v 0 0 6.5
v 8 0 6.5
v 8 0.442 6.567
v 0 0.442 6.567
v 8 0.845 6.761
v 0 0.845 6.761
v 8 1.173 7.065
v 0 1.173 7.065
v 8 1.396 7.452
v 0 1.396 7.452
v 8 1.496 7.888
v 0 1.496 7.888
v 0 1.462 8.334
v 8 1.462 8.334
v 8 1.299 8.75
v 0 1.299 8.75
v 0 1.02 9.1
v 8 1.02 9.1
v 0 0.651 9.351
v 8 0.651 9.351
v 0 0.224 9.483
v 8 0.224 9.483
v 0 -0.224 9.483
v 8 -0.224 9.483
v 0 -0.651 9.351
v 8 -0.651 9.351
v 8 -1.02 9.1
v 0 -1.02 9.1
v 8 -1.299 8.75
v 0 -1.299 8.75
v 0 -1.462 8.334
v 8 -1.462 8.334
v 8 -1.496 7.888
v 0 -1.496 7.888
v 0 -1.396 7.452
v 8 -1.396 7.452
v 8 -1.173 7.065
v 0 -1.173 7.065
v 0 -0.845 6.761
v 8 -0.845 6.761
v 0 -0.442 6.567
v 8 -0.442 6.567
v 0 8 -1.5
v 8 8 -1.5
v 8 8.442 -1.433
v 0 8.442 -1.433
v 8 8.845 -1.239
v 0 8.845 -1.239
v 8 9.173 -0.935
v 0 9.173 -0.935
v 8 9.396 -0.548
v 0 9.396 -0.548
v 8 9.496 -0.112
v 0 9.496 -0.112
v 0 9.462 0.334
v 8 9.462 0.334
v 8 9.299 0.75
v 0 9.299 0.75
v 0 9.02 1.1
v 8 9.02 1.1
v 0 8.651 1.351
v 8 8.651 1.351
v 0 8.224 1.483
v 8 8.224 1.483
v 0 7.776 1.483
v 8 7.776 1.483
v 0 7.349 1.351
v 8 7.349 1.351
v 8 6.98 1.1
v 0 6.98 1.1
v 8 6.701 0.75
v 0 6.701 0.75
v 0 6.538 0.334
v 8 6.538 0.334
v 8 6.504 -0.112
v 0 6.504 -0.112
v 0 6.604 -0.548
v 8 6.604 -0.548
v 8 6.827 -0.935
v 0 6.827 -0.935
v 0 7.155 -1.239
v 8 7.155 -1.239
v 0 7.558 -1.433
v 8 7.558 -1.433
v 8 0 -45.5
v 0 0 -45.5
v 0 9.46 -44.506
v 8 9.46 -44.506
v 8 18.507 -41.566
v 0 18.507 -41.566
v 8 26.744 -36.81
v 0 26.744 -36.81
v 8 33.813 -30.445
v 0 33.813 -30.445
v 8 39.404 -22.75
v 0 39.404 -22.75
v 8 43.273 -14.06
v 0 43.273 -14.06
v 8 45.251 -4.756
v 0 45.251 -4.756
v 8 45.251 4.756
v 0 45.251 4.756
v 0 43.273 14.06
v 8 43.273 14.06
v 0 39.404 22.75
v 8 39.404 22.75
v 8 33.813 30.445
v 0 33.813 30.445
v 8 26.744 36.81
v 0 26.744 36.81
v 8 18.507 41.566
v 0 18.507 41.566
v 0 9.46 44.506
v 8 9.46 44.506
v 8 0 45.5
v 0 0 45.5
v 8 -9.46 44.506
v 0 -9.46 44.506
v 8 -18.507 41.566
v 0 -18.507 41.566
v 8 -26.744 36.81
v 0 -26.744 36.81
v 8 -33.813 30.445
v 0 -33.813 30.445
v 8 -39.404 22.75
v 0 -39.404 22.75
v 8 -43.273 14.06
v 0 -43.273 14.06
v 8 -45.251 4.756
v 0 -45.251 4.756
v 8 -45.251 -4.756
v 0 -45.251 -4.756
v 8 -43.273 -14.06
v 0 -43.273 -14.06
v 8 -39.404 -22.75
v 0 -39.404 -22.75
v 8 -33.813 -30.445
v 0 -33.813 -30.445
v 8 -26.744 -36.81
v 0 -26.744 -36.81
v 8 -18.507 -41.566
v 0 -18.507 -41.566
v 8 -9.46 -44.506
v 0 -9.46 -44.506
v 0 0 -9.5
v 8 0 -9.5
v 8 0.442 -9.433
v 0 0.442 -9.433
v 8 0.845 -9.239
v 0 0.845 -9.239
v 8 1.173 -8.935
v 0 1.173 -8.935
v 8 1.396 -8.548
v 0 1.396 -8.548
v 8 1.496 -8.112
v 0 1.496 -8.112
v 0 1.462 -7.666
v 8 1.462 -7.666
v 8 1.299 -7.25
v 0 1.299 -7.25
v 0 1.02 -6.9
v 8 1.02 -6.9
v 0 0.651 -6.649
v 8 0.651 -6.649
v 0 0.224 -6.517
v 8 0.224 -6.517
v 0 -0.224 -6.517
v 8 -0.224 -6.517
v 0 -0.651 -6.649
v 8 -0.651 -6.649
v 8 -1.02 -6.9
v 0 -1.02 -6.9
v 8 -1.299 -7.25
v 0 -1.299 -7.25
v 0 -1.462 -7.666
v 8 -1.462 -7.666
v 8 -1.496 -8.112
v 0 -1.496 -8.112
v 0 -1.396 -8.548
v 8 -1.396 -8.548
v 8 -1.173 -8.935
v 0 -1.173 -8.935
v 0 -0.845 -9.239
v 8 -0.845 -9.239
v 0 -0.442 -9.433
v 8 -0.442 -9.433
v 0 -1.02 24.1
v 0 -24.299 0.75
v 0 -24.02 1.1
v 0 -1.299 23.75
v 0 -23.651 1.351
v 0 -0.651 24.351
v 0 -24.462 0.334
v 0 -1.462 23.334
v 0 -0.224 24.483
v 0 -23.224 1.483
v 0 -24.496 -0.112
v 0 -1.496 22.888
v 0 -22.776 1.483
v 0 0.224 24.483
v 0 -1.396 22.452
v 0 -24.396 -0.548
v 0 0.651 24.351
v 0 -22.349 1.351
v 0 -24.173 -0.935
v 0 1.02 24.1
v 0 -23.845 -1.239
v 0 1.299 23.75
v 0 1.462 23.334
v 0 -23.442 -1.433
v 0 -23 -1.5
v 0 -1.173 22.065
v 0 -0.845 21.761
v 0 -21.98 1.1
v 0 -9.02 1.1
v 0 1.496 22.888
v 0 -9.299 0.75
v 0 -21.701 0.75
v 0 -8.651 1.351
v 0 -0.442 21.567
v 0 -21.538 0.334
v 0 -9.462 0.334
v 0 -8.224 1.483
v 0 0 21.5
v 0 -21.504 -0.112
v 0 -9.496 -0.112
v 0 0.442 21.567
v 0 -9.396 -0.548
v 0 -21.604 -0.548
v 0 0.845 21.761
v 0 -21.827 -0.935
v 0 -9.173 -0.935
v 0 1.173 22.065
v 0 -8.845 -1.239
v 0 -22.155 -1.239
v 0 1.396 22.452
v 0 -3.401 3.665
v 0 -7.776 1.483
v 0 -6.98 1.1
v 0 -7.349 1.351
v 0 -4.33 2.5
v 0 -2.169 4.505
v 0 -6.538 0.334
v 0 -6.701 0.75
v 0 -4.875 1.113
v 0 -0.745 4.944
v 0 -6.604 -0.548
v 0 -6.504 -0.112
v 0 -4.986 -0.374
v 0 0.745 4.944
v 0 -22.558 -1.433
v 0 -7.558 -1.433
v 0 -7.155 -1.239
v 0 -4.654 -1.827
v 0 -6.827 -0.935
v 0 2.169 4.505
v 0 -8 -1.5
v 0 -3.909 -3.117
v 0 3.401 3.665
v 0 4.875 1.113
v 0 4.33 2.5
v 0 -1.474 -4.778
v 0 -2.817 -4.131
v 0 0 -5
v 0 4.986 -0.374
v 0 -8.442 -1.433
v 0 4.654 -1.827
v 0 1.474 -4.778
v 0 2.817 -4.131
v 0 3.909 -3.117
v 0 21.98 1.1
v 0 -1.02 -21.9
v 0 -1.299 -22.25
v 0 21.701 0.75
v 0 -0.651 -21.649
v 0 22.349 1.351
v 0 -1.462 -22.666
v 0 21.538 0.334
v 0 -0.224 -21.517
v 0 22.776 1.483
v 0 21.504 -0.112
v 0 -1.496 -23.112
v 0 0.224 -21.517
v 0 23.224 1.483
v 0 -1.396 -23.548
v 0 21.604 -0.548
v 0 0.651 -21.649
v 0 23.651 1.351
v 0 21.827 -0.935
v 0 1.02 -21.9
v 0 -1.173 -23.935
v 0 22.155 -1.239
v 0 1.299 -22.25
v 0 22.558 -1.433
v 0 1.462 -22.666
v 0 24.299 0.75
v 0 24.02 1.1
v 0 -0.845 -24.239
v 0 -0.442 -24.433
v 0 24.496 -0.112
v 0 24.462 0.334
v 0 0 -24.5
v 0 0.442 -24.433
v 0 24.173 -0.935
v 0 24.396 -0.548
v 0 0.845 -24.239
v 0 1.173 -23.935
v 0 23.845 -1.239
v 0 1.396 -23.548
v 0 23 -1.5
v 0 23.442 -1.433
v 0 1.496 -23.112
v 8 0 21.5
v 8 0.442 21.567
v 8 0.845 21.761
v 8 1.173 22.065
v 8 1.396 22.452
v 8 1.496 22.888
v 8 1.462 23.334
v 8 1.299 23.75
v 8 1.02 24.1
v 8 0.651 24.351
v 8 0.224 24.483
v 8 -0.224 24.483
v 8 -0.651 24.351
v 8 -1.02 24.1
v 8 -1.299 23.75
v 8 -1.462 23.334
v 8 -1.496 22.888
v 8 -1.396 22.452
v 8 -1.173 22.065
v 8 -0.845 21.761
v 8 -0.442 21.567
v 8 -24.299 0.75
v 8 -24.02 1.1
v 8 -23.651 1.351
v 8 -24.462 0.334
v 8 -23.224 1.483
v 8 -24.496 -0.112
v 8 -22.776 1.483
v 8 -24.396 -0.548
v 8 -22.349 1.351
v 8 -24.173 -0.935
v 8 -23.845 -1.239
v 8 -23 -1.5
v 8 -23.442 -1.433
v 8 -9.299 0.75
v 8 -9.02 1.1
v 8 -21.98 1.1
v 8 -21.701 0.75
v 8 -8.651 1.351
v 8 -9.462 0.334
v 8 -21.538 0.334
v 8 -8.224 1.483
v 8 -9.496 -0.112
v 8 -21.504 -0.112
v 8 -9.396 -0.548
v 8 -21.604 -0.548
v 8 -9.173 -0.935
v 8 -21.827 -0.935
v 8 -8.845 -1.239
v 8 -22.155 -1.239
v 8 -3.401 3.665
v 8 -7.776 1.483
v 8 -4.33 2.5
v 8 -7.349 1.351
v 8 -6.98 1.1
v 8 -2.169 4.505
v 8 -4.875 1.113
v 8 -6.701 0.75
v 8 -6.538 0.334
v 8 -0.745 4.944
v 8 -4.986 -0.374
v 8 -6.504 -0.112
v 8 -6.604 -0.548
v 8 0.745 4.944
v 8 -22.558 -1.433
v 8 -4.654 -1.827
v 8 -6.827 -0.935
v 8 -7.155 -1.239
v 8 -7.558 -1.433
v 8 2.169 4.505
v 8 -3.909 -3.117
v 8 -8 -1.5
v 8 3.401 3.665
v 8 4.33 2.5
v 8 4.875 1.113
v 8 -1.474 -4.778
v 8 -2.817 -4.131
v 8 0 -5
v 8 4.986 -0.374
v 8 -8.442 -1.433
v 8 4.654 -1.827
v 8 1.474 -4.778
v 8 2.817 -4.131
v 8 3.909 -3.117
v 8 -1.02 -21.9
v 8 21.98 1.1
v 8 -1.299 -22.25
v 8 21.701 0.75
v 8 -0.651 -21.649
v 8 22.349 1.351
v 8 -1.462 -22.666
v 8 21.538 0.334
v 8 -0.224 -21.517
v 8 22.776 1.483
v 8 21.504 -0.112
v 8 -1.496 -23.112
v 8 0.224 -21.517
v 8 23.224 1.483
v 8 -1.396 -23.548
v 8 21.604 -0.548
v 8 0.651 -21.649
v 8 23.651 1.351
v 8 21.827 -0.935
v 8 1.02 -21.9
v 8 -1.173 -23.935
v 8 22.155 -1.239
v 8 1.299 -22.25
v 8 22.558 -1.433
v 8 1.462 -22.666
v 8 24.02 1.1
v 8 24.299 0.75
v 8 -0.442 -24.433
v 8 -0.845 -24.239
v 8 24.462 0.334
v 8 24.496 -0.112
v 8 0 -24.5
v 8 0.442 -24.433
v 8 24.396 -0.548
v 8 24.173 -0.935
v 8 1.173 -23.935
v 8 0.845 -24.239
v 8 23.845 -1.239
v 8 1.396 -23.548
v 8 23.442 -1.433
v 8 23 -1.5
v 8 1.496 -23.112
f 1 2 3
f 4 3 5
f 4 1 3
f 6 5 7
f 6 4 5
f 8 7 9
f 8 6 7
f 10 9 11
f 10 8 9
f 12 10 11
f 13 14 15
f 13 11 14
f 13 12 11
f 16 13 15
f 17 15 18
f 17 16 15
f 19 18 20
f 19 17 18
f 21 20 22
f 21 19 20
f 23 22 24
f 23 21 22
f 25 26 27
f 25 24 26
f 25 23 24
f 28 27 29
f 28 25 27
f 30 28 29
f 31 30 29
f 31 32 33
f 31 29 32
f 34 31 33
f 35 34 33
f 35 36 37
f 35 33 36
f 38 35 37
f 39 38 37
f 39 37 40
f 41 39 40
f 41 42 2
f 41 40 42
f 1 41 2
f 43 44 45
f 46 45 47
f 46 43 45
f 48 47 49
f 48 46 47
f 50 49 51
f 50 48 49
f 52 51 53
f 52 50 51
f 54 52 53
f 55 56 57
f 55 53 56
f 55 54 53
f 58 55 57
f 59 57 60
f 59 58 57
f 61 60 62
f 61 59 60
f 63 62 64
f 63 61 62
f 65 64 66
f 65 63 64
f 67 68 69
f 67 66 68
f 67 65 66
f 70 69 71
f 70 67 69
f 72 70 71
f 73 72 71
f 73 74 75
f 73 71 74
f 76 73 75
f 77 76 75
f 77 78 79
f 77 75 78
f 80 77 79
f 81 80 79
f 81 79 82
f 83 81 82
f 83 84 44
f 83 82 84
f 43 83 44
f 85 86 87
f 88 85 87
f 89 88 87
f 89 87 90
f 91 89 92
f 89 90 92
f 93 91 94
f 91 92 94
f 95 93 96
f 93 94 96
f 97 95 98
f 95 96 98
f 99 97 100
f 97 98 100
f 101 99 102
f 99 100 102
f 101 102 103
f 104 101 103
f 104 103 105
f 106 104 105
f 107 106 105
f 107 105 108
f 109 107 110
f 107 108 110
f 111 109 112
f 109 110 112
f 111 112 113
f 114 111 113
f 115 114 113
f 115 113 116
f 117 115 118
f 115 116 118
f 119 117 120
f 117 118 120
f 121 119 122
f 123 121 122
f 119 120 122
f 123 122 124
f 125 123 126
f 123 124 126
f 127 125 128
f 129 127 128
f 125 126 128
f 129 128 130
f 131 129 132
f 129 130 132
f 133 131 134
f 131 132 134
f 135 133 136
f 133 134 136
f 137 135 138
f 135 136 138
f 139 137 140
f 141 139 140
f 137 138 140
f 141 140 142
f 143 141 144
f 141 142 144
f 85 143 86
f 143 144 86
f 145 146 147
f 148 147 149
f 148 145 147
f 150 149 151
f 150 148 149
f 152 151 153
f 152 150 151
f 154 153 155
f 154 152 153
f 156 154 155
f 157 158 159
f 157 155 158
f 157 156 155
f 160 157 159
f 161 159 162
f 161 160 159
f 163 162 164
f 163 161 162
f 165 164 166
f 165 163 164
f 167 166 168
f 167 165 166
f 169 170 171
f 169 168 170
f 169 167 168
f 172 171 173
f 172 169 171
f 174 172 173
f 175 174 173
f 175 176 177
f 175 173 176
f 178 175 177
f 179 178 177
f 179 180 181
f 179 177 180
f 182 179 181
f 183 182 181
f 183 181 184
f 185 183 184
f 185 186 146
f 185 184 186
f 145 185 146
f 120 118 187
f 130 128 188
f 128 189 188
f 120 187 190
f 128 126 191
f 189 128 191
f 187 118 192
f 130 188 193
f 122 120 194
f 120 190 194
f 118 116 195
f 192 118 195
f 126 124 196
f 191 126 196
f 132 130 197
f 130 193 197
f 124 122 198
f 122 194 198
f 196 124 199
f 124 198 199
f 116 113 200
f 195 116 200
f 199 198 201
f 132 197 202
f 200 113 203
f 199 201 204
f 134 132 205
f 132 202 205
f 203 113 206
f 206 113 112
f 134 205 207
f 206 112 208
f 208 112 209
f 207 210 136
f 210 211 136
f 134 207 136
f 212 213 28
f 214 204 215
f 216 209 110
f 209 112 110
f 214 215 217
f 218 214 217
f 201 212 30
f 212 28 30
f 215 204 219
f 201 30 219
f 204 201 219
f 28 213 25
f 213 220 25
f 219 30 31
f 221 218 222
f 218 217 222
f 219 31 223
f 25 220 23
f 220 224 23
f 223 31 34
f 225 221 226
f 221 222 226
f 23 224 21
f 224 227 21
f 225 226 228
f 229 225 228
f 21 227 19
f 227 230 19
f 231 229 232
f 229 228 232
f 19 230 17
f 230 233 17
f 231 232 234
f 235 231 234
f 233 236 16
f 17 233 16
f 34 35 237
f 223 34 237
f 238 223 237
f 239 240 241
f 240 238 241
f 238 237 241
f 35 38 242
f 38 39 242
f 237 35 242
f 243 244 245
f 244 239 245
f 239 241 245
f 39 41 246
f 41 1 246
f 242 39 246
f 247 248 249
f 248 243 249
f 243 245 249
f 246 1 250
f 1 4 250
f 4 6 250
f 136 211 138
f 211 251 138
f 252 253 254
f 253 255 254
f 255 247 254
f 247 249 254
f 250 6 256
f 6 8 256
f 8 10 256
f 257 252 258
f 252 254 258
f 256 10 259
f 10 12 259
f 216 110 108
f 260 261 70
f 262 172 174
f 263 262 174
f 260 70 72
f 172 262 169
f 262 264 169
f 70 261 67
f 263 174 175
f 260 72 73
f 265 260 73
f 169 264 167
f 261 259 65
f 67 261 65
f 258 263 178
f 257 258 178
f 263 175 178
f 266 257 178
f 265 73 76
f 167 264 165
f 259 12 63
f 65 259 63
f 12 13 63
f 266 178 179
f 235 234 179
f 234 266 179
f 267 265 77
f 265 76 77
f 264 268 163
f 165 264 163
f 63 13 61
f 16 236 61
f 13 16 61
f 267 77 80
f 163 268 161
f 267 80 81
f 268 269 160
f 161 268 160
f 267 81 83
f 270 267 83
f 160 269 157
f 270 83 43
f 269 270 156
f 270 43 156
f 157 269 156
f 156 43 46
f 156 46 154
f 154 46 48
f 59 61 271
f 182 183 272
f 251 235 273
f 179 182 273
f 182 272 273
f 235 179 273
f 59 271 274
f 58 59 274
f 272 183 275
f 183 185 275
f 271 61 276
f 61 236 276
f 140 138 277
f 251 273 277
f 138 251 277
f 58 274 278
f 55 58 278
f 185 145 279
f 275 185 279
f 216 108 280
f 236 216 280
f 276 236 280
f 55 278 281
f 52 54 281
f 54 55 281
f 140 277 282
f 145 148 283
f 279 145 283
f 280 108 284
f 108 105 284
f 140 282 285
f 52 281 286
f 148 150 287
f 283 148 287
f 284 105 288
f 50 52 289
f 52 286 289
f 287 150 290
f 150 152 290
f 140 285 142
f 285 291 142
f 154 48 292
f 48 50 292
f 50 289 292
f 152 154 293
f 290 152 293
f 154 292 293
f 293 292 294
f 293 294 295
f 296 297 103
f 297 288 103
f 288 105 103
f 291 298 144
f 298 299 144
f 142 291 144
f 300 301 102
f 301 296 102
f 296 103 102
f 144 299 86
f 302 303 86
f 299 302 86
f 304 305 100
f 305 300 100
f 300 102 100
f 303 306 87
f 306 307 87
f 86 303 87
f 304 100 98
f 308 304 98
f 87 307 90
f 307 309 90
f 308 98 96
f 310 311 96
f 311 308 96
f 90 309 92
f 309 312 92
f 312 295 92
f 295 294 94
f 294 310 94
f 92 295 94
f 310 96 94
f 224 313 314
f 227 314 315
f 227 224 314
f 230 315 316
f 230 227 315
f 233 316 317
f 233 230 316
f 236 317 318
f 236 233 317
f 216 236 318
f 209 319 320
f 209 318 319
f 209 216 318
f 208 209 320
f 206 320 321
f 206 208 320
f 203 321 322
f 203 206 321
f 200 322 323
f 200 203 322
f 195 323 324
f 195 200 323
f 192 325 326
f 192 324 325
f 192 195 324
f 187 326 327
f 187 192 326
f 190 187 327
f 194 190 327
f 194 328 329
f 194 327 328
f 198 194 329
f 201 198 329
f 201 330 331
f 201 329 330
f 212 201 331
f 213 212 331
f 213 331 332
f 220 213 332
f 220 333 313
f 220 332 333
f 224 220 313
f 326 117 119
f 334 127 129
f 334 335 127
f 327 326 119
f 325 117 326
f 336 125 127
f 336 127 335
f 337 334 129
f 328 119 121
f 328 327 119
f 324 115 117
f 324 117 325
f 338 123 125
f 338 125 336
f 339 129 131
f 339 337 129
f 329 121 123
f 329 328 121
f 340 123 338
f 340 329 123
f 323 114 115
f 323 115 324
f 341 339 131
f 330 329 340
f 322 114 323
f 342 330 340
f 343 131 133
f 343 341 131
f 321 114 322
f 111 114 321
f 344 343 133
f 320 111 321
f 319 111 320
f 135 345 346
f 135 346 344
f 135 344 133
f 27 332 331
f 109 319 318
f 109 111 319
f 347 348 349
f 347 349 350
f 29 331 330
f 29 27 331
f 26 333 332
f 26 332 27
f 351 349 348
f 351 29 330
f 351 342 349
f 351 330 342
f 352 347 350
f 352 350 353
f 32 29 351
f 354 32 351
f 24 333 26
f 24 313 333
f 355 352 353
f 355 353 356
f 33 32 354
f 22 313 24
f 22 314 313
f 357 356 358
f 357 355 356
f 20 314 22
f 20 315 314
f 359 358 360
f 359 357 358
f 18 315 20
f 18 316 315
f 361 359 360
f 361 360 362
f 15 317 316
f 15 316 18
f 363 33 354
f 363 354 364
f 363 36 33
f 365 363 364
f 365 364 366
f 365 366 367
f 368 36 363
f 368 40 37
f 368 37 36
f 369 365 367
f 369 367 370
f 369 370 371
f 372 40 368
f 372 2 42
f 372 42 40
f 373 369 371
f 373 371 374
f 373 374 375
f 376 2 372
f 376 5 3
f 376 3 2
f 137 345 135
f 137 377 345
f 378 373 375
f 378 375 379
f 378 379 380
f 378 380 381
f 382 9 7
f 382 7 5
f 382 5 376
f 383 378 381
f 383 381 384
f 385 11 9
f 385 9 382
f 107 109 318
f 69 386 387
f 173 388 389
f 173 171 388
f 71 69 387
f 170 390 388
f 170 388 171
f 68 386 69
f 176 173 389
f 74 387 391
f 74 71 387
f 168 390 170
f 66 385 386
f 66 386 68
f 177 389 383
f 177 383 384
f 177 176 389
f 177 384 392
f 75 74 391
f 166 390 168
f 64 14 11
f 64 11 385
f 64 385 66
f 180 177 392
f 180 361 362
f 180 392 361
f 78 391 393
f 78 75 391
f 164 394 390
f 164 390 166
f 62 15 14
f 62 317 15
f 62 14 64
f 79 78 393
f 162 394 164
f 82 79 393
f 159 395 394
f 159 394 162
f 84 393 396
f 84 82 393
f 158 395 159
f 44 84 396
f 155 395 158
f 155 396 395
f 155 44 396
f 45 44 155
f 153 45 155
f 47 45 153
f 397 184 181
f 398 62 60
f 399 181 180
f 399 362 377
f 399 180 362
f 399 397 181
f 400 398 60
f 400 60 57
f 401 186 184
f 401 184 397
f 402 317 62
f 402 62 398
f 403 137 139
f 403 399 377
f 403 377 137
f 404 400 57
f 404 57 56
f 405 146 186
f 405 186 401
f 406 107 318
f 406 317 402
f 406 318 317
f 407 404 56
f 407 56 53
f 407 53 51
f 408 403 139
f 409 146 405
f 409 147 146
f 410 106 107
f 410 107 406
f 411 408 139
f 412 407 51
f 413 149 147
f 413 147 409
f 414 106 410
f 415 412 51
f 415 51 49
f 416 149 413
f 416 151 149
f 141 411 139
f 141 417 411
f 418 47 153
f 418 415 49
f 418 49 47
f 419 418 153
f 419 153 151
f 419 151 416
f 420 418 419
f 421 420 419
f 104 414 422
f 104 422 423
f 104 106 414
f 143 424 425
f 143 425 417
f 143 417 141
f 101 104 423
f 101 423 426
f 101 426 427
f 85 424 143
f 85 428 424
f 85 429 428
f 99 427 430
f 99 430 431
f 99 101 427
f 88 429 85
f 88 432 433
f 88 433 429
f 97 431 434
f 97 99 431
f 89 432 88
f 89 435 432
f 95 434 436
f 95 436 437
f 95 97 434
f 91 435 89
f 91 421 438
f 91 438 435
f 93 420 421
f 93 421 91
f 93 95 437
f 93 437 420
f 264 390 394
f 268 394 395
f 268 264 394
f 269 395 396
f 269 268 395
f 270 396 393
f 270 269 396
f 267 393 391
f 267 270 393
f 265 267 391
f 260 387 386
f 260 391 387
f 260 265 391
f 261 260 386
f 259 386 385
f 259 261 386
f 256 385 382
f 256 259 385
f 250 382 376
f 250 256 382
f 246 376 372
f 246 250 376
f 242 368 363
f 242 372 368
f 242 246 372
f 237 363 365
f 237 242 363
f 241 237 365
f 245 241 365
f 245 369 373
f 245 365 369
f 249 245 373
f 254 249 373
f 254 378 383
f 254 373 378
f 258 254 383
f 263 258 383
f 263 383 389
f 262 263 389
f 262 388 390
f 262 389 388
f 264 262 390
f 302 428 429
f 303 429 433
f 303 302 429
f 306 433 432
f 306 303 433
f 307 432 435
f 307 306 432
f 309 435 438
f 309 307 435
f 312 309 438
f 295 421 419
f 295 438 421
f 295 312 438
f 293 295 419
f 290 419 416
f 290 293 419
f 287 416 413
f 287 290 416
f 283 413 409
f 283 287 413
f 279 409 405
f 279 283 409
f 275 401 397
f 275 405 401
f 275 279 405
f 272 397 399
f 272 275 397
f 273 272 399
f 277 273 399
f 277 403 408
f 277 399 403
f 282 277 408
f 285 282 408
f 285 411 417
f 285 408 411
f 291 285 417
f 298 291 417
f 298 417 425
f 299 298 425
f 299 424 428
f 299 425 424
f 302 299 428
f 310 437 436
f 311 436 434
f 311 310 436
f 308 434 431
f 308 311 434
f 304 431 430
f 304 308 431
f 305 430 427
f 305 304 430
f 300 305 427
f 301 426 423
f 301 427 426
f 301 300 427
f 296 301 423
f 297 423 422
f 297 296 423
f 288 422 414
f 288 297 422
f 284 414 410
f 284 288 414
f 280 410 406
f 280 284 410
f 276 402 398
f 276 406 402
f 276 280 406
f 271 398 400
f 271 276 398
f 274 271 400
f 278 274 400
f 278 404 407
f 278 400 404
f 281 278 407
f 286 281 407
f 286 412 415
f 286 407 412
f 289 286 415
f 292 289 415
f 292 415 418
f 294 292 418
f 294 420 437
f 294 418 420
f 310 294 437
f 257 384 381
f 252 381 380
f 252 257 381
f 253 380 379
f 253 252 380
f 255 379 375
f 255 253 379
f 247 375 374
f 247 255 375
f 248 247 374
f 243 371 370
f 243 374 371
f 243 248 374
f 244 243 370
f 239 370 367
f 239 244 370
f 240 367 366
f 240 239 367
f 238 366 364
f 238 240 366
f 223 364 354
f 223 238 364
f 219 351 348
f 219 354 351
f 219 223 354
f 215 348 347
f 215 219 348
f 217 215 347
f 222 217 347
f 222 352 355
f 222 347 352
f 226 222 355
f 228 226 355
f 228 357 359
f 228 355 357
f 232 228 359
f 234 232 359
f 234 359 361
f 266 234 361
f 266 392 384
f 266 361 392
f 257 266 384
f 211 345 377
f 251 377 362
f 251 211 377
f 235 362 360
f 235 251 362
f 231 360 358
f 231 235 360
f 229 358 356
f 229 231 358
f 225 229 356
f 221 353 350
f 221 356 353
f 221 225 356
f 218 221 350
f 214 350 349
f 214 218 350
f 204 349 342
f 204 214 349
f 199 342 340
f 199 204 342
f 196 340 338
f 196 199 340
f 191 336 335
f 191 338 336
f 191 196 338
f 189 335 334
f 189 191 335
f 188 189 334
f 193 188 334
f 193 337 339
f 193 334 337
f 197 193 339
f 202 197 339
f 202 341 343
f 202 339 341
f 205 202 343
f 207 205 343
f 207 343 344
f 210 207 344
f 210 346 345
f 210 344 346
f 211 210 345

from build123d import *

# Parameters (mm, degrees)
SPROCKET_R                   = 45.5
ESTRUSIONE_ESTRUSIONE2_DEPTH = 8
SCHIZZO1_R                   = 5
SCHIZZO1_R_2                 = 1.5
TAGLIO_ESTRUSIONE2_DEPTH     = 9


with BuildPart() as part:
    # Sprocket → Estrusione-Estrusione2 (new body)
    with BuildSketch(Plane(origin=(0, 0, 0), x_dir=(0, 0, -1), z_dir=(1, 0, 0))):
        Circle(SPROCKET_R)
    extrude(amount=ESTRUSIONE_ESTRUSIONE2_DEPTH)

    # Schizzo1 → Taglio-Estrusione2 (cut, through all)
    with BuildSketch(Plane(origin=(0, 0, 0), x_dir=(0, 0, -1), z_dir=(1, 0, 0))):
        Circle(SCHIZZO1_R)
        with Locations((0, 23)):
            Circle(SCHIZZO1_R_2)
        with Locations((8, 0)):
            Circle(SCHIZZO1_R_2)
        with Locations((0, 8)):
            Circle(SCHIZZO1_R_2)
        with Locations((23, 0)):
            Circle(SCHIZZO1_R_2)
        with Locations((0, -8)):
            Circle(SCHIZZO1_R_2)
        with Locations((0, -23)):
            Circle(SCHIZZO1_R_2)
        with Locations((-8, 0)):
            Circle(SCHIZZO1_R_2)
        with Locations((-23, 0)):
            Circle(SCHIZZO1_R_2)
    extrude(amount=TAGLIO_ESTRUSIONE2_DEPTH, mode=Mode.SUBTRACT)


solid = part.part
